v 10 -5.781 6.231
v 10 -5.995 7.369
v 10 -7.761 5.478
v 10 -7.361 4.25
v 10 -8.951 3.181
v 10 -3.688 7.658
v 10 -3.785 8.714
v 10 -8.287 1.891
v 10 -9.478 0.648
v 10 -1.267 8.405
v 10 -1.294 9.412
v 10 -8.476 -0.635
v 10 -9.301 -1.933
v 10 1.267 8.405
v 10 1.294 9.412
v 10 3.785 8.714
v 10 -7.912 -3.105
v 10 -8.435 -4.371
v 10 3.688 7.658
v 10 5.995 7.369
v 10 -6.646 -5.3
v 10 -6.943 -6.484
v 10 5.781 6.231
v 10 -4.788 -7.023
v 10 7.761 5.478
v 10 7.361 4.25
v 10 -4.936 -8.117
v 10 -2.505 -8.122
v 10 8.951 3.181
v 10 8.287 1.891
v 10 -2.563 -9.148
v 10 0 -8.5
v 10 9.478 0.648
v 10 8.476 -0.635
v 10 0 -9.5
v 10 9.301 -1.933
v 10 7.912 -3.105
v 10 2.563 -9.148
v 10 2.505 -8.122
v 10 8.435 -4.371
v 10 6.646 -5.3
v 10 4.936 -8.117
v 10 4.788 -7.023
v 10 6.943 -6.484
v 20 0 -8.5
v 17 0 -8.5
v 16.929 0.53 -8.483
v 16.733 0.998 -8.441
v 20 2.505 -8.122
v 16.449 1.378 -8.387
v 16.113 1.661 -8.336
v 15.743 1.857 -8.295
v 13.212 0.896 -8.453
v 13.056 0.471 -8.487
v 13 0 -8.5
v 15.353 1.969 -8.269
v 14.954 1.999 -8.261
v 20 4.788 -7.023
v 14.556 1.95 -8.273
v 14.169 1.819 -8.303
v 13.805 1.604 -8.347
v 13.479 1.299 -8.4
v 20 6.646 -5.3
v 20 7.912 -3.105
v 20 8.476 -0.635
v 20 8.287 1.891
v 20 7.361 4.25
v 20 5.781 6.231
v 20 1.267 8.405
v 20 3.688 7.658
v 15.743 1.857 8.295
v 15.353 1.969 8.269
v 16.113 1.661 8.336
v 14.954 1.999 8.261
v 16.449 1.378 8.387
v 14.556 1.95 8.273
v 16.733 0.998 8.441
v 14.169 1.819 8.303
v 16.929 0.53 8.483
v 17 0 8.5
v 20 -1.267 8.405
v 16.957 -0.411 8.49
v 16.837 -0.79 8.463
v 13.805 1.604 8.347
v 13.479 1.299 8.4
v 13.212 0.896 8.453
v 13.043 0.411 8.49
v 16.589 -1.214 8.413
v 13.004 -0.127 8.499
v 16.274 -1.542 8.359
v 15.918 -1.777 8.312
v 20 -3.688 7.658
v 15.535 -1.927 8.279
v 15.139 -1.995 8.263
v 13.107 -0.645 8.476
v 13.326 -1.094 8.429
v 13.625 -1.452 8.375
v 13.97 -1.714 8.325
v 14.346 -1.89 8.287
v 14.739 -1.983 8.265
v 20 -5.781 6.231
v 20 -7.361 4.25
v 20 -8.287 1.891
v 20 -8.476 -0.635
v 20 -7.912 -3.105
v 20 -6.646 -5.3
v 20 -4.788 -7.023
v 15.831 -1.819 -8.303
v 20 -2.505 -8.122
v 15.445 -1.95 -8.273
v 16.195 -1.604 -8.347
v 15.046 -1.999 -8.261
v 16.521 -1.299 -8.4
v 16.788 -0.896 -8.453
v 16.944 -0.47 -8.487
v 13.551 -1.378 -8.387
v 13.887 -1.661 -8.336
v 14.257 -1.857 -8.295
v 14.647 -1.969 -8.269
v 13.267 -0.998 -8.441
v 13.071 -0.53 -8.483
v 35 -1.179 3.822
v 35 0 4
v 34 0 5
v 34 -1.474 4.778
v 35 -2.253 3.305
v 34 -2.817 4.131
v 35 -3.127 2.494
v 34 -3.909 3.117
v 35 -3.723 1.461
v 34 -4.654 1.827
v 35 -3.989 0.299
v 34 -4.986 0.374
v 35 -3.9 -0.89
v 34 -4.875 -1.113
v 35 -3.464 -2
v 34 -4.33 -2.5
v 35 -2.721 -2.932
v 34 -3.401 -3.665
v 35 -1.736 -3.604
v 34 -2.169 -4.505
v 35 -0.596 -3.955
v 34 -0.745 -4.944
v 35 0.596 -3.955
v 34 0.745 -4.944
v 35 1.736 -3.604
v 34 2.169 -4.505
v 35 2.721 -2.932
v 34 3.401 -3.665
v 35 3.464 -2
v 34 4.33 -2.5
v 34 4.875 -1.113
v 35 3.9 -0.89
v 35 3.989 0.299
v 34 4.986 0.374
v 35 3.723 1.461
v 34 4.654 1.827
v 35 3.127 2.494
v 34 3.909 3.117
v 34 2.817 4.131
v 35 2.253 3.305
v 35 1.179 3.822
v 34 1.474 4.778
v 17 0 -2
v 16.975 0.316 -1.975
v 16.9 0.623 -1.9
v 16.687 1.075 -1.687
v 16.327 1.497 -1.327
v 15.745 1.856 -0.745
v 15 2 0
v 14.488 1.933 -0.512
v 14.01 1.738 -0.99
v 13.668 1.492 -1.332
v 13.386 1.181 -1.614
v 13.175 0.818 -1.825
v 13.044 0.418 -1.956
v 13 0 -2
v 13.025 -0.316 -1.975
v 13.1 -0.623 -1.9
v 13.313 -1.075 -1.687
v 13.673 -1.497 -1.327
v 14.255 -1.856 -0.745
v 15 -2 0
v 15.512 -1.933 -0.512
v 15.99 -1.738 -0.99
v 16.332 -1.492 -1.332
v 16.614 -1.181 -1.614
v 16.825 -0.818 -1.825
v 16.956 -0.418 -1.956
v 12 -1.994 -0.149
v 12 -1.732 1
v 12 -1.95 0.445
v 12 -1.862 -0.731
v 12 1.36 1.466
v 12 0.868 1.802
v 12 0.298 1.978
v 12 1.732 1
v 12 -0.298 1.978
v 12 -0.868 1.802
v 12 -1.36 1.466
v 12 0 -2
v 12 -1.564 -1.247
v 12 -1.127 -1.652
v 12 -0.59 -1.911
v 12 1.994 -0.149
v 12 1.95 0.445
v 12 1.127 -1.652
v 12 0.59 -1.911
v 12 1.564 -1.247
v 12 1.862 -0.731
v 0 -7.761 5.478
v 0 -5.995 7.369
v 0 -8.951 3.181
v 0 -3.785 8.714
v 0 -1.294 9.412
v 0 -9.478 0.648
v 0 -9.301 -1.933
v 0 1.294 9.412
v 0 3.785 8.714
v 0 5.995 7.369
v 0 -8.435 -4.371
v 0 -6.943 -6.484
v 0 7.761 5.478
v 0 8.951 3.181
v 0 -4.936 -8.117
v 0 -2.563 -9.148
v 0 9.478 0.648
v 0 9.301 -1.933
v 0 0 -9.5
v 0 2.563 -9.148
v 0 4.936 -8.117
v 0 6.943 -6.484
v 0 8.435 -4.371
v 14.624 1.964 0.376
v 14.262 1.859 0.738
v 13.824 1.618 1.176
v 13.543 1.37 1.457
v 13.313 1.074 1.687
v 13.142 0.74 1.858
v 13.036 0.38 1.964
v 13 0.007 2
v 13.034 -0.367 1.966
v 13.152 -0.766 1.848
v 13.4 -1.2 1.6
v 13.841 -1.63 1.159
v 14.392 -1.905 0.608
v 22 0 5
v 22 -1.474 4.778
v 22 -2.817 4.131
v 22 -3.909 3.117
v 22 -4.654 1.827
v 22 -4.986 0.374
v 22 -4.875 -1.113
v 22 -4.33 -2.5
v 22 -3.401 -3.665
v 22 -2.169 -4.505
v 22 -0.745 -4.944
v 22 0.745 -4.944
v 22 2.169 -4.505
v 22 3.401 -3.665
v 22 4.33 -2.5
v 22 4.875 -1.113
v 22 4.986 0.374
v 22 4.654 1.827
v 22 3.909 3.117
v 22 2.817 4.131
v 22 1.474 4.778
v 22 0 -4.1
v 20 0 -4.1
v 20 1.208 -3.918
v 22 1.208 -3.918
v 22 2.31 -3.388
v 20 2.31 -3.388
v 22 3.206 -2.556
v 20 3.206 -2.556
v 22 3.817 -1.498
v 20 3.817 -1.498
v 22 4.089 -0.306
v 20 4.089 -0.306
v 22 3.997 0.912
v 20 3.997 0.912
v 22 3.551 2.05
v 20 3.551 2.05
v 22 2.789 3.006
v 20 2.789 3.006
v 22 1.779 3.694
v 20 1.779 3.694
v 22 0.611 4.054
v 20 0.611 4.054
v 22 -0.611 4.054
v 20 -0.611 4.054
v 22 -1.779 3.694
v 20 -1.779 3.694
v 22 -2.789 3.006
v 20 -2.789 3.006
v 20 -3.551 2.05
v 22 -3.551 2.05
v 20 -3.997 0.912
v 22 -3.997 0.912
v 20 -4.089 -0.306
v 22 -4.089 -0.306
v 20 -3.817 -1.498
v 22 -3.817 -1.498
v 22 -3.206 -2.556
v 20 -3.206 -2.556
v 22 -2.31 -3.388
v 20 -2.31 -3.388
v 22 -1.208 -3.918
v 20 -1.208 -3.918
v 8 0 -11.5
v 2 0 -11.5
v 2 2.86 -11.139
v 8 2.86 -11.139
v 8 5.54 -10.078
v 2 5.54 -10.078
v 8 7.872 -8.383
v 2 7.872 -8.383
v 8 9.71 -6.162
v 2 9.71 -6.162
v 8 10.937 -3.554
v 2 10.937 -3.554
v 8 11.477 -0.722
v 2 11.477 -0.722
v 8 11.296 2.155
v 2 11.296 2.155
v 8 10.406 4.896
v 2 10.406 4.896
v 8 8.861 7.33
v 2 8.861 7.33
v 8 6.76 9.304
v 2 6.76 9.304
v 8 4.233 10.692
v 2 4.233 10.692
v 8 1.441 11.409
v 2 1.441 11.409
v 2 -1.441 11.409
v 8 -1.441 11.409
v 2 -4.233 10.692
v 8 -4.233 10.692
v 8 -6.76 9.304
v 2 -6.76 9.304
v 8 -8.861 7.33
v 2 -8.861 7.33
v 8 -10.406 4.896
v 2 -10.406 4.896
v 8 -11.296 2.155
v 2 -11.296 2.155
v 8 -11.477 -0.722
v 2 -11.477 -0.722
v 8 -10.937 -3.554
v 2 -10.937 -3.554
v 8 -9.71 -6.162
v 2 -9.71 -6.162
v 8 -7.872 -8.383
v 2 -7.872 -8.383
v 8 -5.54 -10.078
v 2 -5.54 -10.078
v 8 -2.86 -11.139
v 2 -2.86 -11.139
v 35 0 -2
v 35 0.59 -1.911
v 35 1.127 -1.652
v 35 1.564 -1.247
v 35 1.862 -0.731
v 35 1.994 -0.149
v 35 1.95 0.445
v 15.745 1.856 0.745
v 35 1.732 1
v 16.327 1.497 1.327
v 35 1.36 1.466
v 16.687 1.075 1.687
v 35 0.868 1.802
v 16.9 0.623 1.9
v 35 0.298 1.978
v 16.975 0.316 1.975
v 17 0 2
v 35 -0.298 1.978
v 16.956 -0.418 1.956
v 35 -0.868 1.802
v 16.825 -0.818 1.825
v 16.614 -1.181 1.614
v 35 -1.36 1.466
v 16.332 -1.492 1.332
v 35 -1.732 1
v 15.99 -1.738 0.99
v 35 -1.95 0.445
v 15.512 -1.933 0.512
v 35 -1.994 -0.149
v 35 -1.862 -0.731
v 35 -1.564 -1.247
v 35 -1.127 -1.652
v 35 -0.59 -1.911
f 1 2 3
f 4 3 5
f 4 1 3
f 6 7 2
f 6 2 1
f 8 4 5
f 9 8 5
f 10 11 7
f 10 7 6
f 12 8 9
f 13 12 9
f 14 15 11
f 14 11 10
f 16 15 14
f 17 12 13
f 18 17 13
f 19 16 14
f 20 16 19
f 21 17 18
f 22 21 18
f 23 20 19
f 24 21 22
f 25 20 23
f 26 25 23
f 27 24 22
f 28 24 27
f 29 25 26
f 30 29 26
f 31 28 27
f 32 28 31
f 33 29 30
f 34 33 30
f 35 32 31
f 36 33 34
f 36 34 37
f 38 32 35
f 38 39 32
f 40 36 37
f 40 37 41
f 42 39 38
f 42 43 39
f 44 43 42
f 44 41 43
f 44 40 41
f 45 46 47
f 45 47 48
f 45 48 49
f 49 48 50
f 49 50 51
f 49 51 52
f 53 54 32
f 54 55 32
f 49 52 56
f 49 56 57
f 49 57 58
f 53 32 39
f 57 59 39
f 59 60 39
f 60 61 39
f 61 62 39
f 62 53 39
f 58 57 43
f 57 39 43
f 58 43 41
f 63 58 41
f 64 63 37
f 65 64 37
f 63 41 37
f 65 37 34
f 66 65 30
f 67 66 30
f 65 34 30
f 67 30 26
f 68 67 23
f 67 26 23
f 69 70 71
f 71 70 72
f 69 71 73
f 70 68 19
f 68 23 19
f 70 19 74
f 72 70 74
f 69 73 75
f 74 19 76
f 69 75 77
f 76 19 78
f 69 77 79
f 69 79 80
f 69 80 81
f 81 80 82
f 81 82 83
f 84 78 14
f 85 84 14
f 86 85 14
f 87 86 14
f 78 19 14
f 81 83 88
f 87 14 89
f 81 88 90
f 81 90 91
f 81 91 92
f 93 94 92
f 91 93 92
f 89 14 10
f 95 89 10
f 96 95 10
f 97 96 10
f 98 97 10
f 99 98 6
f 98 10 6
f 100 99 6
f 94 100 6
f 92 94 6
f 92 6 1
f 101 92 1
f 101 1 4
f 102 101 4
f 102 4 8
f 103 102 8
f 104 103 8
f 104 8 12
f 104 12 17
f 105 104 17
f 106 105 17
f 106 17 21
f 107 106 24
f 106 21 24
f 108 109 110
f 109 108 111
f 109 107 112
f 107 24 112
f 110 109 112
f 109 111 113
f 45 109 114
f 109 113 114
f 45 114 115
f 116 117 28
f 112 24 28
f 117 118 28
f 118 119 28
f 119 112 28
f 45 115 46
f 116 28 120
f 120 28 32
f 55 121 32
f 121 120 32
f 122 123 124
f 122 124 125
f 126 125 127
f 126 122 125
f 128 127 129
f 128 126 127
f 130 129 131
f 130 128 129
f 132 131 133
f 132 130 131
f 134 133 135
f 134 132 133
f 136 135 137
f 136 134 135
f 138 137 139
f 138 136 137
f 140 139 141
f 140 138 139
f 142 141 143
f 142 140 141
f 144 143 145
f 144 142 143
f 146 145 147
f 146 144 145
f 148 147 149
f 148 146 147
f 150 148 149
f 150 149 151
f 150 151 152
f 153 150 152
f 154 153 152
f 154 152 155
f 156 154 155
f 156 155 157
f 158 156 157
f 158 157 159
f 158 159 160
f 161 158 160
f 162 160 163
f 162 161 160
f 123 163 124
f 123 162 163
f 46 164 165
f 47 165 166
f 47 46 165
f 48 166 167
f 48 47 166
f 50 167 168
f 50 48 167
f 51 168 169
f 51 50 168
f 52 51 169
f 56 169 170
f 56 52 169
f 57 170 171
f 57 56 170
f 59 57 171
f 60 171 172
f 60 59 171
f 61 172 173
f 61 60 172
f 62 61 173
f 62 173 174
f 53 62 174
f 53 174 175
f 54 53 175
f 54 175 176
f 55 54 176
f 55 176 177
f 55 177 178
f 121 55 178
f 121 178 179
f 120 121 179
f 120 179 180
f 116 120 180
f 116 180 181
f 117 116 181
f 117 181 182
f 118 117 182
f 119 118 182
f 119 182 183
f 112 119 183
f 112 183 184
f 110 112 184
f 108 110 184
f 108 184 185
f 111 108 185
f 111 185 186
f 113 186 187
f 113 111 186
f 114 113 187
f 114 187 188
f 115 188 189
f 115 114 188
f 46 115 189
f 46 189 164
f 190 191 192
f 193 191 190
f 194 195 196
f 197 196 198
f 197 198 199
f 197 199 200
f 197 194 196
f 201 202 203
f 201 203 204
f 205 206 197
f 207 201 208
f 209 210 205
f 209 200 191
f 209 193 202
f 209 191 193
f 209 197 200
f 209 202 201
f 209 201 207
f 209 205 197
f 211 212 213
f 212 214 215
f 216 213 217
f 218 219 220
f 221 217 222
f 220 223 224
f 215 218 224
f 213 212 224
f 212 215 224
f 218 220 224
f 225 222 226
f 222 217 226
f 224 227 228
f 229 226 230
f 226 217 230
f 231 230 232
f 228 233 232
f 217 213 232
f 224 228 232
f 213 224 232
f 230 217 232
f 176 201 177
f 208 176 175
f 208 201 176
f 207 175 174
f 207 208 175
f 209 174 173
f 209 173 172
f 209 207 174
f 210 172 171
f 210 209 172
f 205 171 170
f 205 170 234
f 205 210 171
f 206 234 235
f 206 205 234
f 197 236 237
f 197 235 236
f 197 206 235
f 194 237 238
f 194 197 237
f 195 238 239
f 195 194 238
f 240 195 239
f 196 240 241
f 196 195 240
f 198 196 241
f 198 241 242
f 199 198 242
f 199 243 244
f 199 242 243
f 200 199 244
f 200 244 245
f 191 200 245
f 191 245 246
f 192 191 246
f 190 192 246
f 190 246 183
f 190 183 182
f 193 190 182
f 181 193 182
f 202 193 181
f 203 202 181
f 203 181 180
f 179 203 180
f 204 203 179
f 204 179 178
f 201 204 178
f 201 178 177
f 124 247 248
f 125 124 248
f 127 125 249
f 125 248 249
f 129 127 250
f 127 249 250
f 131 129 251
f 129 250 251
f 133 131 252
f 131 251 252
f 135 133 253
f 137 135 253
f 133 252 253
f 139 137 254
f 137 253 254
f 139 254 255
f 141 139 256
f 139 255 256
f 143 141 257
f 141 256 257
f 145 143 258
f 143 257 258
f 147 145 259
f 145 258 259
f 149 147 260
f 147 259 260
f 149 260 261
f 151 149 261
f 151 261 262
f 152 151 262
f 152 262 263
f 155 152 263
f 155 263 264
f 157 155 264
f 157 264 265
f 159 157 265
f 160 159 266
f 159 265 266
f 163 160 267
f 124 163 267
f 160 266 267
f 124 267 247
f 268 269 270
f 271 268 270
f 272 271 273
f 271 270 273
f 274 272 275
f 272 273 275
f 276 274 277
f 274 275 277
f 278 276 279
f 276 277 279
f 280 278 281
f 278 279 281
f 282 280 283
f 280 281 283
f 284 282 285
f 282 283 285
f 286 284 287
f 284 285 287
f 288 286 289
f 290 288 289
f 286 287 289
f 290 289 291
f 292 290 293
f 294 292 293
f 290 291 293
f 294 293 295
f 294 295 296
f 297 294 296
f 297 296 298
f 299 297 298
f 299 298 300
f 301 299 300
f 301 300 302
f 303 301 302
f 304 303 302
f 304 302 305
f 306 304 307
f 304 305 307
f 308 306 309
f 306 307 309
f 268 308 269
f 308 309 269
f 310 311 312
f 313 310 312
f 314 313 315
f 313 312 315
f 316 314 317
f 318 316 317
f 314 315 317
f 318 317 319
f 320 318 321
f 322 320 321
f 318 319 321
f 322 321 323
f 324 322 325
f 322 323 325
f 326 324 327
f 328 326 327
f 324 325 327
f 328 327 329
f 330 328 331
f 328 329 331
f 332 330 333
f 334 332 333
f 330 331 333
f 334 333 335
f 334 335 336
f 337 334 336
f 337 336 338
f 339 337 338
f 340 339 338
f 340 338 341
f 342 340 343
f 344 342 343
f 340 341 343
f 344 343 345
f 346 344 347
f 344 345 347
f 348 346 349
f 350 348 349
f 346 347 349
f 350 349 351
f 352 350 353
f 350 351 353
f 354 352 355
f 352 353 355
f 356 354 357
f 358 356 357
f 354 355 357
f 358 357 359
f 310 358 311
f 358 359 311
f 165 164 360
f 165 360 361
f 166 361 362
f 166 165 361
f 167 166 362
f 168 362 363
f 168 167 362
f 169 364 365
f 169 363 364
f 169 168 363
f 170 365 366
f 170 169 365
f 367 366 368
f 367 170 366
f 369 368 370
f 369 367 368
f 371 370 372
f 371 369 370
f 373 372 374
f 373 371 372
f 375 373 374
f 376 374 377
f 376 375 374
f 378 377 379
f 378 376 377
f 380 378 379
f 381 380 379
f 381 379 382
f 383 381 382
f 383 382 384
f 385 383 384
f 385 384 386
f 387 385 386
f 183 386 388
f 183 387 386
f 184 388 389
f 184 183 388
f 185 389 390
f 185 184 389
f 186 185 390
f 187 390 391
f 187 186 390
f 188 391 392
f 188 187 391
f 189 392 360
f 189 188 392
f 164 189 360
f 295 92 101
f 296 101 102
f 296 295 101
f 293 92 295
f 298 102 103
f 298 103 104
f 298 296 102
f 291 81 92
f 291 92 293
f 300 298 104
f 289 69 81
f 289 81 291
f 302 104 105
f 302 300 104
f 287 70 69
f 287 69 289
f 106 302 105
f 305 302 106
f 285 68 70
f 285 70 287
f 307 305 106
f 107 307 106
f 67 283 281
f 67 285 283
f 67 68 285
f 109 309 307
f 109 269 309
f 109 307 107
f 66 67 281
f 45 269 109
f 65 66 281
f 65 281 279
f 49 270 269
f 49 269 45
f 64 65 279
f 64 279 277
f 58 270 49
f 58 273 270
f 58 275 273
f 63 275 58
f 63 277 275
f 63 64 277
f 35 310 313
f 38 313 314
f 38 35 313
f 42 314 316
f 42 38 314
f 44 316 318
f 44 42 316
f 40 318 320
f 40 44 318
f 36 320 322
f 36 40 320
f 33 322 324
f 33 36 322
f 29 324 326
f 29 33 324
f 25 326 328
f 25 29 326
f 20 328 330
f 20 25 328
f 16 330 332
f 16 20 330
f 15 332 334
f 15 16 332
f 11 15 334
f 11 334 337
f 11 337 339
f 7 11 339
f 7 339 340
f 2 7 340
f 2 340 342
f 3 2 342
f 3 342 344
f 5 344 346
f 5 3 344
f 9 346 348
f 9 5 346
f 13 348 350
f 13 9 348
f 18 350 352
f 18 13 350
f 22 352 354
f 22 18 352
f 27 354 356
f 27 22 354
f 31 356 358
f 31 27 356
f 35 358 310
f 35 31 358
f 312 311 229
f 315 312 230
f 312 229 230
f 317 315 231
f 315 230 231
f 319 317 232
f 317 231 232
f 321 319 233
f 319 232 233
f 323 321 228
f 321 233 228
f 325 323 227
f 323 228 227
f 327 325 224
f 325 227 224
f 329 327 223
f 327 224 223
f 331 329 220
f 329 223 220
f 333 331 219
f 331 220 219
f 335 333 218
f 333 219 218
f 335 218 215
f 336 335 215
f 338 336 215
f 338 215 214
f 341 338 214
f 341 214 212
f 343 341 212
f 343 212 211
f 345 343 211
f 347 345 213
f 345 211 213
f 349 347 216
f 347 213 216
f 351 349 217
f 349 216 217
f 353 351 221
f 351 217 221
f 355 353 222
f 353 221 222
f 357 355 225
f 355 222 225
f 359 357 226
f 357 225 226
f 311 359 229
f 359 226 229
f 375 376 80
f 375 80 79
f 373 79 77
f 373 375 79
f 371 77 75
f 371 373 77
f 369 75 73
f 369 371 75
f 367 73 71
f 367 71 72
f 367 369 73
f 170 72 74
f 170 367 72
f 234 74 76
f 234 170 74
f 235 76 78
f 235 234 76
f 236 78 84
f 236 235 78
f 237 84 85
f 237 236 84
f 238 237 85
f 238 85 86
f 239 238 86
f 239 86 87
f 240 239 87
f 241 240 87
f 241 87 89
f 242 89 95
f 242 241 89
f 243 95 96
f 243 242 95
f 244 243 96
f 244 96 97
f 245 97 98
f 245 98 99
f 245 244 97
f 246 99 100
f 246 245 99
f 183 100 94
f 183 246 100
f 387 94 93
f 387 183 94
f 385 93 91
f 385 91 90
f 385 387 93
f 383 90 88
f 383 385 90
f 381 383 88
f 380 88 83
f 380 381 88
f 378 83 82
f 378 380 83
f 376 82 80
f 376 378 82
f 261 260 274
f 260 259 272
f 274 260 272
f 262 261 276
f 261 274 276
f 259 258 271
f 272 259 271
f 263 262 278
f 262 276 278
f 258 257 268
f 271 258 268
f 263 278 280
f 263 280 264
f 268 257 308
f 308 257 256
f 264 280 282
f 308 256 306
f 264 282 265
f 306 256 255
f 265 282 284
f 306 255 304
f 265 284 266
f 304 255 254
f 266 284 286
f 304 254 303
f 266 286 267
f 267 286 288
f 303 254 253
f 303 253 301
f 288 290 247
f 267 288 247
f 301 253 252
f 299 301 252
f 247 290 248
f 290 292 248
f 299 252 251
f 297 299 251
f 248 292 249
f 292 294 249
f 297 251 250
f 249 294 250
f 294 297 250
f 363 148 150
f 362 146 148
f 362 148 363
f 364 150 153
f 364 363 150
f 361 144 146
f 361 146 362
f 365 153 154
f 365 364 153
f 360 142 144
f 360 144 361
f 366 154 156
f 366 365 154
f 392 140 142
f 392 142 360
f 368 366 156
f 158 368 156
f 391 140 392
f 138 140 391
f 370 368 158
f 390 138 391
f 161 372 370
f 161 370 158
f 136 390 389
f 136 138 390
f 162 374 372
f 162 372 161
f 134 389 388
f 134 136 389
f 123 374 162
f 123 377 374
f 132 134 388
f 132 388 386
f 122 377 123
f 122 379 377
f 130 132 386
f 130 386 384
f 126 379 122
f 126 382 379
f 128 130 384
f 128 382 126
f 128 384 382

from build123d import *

# Parameters (mm, degrees)
SKETCH_1_R               = 11.5
EXTRUDE_1_DEPTH          = 10
CHAMFER_1_SIZE           = 2
CHAMFER_2_SIZE           = 2
SKETCH_2_R               = 8.5
EXTRUDE_2_DEPTH          = 10
SKETCH_3_R               = 4.1
EXTRUDE_3_DEPTH          = 2
SKETCH_4_R               = 5
EXTRUDE_4_DEPTH          = 13
CHAMFER_3_SIZE           = 1
CUT_EXTRUDE_1_DEPTH      = 39.594040991
CUT_EXTRUDE_1_DEPTH_BACK = 39.594040991
SKETCH_5_R               = 2
CUT_EXTRUDE_2_DEPTH      = 39.594040991
CUT_EXTRUDE_2_DEPTH_BACK = 23
SKETCH_6_R               = 2


with BuildPart() as part:
    # 草图1 → 凸台-拉伸1 (new body)
    with BuildSketch(Plane(origin=(0, 0, 0), x_dir=(0, 0, -1), z_dir=(1, 0, 0))):
        Circle(SKETCH_1_R)
    extrude(amount=EXTRUDE_1_DEPTH)

    # 倒角1
    chamfer_1_edges = [part.edges().sort_by_distance(p)[0] for p in [
        (0, 0, 11.5),
    ]]
    chamfer(chamfer_1_edges, length=CHAMFER_1_SIZE)

    # 倒角2
    chamfer_2_edges = [part.edges().sort_by_distance(p)[0] for p in [
        (10, 0, 11.5),
    ]]
    chamfer(chamfer_2_edges, length=CHAMFER_2_SIZE)

    # 草图2 → 凸台-拉伸2 (add)
    with BuildSketch(Plane(origin=(10, 0, 0), x_dir=(0, 0, -1), z_dir=(1, 0, 0))):
        Circle(SKETCH_2_R)
    extrude(amount=EXTRUDE_2_DEPTH)

    # 草图3 → 凸台-拉伸3 (add)
    with BuildSketch(Plane(origin=(20, 0, 0), x_dir=(0, 0, -1), z_dir=(1, 0, 0))):
        Circle(SKETCH_3_R)
    extrude(amount=EXTRUDE_3_DEPTH)

    # 草图4 → 凸台-拉伸4 (add)
    with BuildSketch(Plane(origin=(22, 0, 0), x_dir=(0, 0, -1), z_dir=(1, 0, 0))):
        Circle(SKETCH_4_R)
    extrude(amount=EXTRUDE_4_DEPTH)

    # 倒角3
    chamfer_3_edges = [part.edges().sort_by_distance(p)[0] for p in [
        (35, 0, 5),
    ]]
    chamfer(chamfer_3_edges, length=CHAMFER_3_SIZE)

    # 草图5 → 切除-拉伸1 (cut, two sides: drawn at the far end of the back side and taken through both)
    with BuildSketch(Plane.XY.offset(-CUT_EXTRUDE_1_DEPTH_BACK)):
        with Locations((15, 0)):
            Circle(SKETCH_5_R)
    extrude(amount=CUT_EXTRUDE_1_DEPTH + CUT_EXTRUDE_1_DEPTH_BACK, mode=Mode.SUBTRACT)

    # 草图6 → 切除-拉伸2 (cut, two sides: drawn at the far end of the back side and taken through both)
    with BuildSketch(Plane(origin=(35, 0, 0), x_dir=(0, 0, -1), z_dir=(1, 0, 0)).offset(-CUT_EXTRUDE_2_DEPTH_BACK)):
        Circle(SKETCH_6_R)
    extrude(amount=CUT_EXTRUDE_2_DEPTH + CUT_EXTRUDE_2_DEPTH_BACK, mode=Mode.SUBTRACT)


solid = part.part
